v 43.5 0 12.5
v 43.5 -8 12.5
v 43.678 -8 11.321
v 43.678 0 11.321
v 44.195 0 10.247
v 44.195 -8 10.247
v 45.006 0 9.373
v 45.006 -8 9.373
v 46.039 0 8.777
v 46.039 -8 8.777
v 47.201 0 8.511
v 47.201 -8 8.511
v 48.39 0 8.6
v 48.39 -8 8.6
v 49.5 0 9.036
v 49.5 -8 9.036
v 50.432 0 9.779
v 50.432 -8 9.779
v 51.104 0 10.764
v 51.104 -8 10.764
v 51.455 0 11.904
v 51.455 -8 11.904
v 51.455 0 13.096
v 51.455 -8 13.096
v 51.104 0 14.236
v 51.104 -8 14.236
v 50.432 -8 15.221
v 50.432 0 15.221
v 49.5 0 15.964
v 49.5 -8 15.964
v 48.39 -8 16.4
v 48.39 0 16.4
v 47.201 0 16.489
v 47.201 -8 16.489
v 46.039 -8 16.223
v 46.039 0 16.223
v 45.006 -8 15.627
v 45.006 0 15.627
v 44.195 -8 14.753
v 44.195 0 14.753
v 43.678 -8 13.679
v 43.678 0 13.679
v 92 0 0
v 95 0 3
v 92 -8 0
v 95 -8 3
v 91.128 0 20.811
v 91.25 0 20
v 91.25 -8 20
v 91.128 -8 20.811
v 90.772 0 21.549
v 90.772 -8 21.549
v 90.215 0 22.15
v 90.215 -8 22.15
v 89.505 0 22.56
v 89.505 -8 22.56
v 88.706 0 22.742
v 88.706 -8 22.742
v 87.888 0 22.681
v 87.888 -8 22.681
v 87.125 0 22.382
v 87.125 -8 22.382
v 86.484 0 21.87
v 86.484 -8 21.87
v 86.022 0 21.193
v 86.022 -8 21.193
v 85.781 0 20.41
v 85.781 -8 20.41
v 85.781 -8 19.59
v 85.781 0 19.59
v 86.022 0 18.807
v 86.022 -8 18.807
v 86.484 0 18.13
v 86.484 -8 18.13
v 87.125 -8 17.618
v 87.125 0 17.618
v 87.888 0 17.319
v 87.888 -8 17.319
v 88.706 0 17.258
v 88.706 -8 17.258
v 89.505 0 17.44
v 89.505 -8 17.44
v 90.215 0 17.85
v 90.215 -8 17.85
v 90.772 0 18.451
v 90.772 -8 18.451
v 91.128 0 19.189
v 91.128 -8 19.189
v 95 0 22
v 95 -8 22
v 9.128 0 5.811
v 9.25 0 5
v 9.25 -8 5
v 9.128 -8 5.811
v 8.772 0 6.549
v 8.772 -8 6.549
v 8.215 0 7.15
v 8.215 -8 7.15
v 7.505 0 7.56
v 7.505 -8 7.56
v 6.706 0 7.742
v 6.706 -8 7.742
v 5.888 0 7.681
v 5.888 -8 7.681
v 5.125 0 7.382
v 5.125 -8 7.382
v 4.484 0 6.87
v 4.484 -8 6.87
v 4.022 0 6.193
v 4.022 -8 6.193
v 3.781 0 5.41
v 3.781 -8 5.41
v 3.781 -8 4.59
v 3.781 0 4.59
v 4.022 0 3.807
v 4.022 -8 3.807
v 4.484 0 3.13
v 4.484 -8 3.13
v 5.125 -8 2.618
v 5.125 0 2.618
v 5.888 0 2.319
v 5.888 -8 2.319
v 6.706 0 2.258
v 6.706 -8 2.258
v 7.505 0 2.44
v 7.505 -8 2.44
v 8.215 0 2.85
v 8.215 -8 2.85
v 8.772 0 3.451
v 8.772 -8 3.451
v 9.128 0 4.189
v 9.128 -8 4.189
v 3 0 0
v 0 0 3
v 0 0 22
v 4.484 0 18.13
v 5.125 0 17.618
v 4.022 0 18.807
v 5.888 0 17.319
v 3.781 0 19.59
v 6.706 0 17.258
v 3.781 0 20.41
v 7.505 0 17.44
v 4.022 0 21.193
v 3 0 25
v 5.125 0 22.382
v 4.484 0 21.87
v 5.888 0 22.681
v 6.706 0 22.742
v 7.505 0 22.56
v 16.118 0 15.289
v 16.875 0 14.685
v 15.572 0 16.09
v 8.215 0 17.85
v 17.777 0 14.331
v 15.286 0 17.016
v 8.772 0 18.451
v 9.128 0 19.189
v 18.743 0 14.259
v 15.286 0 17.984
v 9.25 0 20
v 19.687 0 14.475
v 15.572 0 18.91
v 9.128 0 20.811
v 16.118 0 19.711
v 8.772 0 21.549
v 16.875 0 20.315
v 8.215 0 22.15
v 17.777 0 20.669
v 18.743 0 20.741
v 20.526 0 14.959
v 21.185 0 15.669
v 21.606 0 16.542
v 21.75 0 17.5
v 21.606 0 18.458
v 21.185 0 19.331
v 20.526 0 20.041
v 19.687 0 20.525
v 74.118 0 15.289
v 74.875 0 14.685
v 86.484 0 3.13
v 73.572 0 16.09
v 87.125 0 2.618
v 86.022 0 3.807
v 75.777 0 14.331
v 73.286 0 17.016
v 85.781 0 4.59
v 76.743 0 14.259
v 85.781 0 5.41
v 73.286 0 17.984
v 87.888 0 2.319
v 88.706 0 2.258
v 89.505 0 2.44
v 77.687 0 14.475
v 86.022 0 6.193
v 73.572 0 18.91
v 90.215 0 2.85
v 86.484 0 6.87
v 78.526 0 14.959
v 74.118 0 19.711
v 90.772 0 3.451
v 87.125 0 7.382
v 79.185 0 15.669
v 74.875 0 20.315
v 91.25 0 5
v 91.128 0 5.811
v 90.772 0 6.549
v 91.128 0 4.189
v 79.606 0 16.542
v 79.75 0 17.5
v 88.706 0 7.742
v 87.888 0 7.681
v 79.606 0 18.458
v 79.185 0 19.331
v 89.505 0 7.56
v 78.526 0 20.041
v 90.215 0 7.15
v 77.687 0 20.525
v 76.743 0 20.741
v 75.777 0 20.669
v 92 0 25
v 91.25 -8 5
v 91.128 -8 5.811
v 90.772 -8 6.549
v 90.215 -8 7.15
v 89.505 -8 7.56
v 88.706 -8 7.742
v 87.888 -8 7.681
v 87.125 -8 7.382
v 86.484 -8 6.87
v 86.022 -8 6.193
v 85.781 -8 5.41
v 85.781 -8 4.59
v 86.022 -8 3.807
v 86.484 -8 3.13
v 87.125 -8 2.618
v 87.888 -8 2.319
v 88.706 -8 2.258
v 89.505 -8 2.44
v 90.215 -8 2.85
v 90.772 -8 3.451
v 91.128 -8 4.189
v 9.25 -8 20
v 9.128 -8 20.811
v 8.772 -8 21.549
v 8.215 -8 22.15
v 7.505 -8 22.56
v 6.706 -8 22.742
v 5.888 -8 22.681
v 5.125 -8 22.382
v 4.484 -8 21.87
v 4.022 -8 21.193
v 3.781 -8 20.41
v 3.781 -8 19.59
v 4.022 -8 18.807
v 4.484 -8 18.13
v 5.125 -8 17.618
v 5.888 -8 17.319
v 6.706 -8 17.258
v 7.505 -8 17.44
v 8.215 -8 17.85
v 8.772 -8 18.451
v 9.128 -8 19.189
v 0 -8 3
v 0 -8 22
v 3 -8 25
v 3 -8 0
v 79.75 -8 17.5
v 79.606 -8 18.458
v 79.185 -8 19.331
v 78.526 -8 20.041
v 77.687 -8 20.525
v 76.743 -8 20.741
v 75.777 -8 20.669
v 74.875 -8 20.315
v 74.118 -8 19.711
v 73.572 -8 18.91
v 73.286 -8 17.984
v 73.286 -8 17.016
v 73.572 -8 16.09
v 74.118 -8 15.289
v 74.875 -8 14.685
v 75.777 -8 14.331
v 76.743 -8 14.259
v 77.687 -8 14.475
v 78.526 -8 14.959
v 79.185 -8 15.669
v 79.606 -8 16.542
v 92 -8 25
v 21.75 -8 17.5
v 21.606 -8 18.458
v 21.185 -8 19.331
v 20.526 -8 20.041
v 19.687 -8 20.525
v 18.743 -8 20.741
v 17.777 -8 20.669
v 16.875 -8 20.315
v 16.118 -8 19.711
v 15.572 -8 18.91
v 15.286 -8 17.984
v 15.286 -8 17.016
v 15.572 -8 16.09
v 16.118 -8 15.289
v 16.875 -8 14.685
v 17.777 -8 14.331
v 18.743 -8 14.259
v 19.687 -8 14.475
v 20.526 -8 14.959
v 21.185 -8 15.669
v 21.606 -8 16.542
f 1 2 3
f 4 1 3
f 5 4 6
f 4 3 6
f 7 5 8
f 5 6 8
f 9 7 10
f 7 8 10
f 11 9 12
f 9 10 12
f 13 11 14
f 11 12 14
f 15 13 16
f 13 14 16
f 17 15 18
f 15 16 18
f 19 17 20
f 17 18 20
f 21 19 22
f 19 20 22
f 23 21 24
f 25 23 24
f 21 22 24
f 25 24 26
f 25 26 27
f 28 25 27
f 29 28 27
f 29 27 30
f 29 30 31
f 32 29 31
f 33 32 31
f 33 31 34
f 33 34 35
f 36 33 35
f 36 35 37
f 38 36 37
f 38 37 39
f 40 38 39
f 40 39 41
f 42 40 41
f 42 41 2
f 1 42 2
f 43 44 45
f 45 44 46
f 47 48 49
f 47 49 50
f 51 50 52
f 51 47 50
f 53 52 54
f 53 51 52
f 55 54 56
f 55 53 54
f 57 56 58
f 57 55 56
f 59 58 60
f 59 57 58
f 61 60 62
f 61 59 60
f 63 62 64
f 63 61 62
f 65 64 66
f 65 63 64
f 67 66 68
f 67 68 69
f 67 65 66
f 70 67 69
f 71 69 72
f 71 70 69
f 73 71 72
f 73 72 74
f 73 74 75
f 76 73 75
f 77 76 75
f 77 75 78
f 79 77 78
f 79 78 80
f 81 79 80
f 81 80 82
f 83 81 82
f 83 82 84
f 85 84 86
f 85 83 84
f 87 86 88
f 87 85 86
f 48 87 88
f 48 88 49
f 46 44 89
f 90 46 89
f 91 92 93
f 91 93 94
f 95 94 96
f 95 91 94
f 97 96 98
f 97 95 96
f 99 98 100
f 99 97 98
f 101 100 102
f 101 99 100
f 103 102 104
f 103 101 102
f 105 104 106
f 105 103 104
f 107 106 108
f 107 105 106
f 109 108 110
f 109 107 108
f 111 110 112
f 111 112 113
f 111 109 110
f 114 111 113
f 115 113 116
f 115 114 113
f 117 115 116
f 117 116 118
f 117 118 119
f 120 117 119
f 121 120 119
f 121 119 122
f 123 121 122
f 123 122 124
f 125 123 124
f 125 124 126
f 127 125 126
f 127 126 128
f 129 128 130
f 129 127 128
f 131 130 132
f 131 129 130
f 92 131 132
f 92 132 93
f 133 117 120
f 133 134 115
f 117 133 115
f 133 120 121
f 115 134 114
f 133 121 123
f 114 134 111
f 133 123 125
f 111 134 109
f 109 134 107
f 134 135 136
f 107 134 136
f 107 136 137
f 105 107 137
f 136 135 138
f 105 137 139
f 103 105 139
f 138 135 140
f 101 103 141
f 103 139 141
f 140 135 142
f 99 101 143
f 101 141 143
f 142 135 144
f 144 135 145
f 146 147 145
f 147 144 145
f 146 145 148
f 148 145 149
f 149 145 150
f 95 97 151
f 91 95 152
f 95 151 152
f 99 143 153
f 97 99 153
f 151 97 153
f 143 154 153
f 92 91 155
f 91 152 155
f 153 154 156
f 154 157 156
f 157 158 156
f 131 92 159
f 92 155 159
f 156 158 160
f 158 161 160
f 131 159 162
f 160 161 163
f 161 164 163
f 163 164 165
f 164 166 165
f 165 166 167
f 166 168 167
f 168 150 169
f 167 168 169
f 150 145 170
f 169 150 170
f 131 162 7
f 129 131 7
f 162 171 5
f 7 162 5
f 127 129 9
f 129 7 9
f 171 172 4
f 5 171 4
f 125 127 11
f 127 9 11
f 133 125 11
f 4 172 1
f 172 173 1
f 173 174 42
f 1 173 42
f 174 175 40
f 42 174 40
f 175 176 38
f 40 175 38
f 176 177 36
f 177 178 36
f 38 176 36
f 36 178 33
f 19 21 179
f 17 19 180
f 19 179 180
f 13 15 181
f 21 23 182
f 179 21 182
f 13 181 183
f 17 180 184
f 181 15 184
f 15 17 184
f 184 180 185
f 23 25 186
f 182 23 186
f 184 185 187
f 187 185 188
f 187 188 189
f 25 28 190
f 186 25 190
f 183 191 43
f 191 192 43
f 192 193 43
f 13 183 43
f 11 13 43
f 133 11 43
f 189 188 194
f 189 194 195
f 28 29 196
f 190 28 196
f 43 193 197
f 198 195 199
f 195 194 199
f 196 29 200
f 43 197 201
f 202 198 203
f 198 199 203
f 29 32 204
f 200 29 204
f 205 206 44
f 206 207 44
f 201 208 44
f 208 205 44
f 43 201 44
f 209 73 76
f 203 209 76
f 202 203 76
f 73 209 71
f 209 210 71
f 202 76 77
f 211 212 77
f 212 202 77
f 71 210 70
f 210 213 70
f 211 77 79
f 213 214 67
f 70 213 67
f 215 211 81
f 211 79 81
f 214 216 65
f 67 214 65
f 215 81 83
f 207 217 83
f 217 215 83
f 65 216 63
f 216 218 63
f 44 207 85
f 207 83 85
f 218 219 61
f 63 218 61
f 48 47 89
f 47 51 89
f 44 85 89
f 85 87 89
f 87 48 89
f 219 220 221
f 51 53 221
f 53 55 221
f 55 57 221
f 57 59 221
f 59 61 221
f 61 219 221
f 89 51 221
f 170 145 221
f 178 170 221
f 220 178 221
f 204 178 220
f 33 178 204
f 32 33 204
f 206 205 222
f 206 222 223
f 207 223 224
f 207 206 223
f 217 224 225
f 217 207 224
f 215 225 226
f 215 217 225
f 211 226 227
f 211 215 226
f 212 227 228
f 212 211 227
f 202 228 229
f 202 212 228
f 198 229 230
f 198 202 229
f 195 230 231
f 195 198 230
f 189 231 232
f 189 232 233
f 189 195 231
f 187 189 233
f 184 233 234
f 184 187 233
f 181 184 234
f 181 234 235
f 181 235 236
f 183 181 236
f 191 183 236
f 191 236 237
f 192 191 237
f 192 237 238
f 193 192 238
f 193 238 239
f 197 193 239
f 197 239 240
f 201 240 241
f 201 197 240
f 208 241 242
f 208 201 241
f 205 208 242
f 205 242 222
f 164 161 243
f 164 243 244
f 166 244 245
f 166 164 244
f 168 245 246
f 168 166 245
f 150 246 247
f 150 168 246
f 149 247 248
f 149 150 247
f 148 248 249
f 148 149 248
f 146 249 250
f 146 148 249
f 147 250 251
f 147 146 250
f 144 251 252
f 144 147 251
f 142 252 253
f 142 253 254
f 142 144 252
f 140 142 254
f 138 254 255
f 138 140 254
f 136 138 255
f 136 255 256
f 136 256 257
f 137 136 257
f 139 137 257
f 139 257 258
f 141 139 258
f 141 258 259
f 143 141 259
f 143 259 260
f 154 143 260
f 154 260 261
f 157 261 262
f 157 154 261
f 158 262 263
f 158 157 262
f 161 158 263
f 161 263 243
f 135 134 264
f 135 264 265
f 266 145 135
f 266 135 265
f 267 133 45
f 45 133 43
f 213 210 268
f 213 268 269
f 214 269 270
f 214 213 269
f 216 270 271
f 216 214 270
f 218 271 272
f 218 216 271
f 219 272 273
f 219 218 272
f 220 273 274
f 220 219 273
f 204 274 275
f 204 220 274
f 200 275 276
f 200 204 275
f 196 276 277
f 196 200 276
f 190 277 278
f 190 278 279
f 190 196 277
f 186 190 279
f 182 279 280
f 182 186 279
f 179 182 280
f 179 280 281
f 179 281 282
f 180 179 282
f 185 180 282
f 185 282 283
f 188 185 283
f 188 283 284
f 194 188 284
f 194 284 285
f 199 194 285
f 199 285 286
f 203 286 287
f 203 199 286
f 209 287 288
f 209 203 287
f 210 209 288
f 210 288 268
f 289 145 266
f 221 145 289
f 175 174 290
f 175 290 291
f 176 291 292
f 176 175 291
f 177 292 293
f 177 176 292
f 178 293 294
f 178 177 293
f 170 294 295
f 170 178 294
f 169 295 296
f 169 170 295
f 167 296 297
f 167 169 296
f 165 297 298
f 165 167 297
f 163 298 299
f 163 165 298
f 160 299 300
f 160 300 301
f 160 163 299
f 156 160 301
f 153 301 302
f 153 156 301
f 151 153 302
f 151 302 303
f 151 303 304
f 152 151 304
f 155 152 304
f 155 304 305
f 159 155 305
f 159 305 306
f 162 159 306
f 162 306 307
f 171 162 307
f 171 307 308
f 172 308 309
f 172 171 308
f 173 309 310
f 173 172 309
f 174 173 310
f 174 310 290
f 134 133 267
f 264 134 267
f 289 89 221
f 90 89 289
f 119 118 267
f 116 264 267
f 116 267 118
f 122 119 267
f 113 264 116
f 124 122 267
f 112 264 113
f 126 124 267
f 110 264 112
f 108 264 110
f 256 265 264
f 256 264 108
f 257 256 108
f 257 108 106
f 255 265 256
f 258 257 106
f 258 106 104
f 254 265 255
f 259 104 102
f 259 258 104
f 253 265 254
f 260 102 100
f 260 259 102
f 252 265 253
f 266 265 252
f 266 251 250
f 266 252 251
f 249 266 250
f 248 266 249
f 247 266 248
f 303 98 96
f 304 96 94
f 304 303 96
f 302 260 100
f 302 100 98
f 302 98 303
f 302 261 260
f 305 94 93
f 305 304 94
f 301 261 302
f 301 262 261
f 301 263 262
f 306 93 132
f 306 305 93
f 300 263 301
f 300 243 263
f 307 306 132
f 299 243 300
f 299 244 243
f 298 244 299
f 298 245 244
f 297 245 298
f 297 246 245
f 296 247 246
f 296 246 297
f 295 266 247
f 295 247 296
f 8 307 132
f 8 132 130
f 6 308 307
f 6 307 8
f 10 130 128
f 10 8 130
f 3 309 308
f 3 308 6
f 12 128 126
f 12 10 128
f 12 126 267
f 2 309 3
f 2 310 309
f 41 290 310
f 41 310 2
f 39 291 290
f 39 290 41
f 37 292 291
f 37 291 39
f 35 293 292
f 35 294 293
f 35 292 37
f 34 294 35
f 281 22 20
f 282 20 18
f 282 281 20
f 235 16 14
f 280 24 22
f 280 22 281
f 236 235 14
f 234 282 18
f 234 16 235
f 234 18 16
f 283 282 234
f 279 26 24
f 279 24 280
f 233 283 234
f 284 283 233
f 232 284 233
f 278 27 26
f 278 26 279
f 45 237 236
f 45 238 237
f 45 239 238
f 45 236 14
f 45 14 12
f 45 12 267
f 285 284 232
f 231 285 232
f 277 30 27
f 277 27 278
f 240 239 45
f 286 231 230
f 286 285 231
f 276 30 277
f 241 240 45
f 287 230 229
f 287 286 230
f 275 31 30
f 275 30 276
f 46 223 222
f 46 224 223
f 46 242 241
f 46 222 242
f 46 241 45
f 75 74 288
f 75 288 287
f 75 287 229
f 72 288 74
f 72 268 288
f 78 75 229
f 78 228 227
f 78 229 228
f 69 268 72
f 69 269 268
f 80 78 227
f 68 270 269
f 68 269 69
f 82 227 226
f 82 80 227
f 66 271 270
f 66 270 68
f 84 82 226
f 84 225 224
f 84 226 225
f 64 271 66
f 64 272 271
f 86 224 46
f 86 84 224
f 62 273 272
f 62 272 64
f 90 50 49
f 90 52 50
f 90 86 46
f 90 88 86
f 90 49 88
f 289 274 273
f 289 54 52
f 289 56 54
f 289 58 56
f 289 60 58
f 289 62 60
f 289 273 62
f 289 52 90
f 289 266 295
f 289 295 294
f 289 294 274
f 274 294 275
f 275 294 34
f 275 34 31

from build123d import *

# Parameters (mm, degrees)
F0_W     = 95
F0_H     = 25
F0_R     = 2.75
F0_R_2   = 3.25
F0_R_3   = 4
F1_DEPTH = 8
F2_D     = 8
F3_SIZE  = 3


with BuildPart() as f1:
    # F0 (on Front) → F1 (new body)
    with BuildSketch(Plane.XZ):
        with Locations((47.5, 12.5)):
            Rectangle(F0_W, F0_H)
        with Locations((6.5, 5)):
            Circle(F0_R, mode=Mode.SUBTRACT)
        with Locations((88.5, 5)):
            Circle(F0_R, mode=Mode.SUBTRACT)
        with Locations((18.5, 17.5)):
            Circle(F0_R_2, mode=Mode.SUBTRACT)
        with Locations((6.5, 20)):
            Circle(F0_R, mode=Mode.SUBTRACT)
        with Locations((47.5, 12.5)):
            Circle(F0_R_3, mode=Mode.SUBTRACT)
        with Locations((76.5, 17.5)):
            Circle(F0_R_2, mode=Mode.SUBTRACT)
        with Locations((88.5, 20)):
            Circle(F0_R, mode=Mode.SUBTRACT)
        with Locations((47.5, 12.5)):
            Circle(F0_R_3)
    extrude(amount=F1_DEPTH)

    # F2 (through all)
    with Locations(Plane(origin=(0, 0, 0), x_dir=(1, 0, 0), z_dir=(0, 1, 0))):
        with Locations((47.5, -12.5)):
            Hole(F2_D / 2)

    # F3
    f3_edges = [f1.edges().sort_by_distance(p)[0] for p in [
        (95, -4, 25),
        (95, -4, 0),
        (0, -4, 25),
        (0, -4, 0),
    ]]
    chamfer(f3_edges, length=F3_SIZE)


solid = f1.part
